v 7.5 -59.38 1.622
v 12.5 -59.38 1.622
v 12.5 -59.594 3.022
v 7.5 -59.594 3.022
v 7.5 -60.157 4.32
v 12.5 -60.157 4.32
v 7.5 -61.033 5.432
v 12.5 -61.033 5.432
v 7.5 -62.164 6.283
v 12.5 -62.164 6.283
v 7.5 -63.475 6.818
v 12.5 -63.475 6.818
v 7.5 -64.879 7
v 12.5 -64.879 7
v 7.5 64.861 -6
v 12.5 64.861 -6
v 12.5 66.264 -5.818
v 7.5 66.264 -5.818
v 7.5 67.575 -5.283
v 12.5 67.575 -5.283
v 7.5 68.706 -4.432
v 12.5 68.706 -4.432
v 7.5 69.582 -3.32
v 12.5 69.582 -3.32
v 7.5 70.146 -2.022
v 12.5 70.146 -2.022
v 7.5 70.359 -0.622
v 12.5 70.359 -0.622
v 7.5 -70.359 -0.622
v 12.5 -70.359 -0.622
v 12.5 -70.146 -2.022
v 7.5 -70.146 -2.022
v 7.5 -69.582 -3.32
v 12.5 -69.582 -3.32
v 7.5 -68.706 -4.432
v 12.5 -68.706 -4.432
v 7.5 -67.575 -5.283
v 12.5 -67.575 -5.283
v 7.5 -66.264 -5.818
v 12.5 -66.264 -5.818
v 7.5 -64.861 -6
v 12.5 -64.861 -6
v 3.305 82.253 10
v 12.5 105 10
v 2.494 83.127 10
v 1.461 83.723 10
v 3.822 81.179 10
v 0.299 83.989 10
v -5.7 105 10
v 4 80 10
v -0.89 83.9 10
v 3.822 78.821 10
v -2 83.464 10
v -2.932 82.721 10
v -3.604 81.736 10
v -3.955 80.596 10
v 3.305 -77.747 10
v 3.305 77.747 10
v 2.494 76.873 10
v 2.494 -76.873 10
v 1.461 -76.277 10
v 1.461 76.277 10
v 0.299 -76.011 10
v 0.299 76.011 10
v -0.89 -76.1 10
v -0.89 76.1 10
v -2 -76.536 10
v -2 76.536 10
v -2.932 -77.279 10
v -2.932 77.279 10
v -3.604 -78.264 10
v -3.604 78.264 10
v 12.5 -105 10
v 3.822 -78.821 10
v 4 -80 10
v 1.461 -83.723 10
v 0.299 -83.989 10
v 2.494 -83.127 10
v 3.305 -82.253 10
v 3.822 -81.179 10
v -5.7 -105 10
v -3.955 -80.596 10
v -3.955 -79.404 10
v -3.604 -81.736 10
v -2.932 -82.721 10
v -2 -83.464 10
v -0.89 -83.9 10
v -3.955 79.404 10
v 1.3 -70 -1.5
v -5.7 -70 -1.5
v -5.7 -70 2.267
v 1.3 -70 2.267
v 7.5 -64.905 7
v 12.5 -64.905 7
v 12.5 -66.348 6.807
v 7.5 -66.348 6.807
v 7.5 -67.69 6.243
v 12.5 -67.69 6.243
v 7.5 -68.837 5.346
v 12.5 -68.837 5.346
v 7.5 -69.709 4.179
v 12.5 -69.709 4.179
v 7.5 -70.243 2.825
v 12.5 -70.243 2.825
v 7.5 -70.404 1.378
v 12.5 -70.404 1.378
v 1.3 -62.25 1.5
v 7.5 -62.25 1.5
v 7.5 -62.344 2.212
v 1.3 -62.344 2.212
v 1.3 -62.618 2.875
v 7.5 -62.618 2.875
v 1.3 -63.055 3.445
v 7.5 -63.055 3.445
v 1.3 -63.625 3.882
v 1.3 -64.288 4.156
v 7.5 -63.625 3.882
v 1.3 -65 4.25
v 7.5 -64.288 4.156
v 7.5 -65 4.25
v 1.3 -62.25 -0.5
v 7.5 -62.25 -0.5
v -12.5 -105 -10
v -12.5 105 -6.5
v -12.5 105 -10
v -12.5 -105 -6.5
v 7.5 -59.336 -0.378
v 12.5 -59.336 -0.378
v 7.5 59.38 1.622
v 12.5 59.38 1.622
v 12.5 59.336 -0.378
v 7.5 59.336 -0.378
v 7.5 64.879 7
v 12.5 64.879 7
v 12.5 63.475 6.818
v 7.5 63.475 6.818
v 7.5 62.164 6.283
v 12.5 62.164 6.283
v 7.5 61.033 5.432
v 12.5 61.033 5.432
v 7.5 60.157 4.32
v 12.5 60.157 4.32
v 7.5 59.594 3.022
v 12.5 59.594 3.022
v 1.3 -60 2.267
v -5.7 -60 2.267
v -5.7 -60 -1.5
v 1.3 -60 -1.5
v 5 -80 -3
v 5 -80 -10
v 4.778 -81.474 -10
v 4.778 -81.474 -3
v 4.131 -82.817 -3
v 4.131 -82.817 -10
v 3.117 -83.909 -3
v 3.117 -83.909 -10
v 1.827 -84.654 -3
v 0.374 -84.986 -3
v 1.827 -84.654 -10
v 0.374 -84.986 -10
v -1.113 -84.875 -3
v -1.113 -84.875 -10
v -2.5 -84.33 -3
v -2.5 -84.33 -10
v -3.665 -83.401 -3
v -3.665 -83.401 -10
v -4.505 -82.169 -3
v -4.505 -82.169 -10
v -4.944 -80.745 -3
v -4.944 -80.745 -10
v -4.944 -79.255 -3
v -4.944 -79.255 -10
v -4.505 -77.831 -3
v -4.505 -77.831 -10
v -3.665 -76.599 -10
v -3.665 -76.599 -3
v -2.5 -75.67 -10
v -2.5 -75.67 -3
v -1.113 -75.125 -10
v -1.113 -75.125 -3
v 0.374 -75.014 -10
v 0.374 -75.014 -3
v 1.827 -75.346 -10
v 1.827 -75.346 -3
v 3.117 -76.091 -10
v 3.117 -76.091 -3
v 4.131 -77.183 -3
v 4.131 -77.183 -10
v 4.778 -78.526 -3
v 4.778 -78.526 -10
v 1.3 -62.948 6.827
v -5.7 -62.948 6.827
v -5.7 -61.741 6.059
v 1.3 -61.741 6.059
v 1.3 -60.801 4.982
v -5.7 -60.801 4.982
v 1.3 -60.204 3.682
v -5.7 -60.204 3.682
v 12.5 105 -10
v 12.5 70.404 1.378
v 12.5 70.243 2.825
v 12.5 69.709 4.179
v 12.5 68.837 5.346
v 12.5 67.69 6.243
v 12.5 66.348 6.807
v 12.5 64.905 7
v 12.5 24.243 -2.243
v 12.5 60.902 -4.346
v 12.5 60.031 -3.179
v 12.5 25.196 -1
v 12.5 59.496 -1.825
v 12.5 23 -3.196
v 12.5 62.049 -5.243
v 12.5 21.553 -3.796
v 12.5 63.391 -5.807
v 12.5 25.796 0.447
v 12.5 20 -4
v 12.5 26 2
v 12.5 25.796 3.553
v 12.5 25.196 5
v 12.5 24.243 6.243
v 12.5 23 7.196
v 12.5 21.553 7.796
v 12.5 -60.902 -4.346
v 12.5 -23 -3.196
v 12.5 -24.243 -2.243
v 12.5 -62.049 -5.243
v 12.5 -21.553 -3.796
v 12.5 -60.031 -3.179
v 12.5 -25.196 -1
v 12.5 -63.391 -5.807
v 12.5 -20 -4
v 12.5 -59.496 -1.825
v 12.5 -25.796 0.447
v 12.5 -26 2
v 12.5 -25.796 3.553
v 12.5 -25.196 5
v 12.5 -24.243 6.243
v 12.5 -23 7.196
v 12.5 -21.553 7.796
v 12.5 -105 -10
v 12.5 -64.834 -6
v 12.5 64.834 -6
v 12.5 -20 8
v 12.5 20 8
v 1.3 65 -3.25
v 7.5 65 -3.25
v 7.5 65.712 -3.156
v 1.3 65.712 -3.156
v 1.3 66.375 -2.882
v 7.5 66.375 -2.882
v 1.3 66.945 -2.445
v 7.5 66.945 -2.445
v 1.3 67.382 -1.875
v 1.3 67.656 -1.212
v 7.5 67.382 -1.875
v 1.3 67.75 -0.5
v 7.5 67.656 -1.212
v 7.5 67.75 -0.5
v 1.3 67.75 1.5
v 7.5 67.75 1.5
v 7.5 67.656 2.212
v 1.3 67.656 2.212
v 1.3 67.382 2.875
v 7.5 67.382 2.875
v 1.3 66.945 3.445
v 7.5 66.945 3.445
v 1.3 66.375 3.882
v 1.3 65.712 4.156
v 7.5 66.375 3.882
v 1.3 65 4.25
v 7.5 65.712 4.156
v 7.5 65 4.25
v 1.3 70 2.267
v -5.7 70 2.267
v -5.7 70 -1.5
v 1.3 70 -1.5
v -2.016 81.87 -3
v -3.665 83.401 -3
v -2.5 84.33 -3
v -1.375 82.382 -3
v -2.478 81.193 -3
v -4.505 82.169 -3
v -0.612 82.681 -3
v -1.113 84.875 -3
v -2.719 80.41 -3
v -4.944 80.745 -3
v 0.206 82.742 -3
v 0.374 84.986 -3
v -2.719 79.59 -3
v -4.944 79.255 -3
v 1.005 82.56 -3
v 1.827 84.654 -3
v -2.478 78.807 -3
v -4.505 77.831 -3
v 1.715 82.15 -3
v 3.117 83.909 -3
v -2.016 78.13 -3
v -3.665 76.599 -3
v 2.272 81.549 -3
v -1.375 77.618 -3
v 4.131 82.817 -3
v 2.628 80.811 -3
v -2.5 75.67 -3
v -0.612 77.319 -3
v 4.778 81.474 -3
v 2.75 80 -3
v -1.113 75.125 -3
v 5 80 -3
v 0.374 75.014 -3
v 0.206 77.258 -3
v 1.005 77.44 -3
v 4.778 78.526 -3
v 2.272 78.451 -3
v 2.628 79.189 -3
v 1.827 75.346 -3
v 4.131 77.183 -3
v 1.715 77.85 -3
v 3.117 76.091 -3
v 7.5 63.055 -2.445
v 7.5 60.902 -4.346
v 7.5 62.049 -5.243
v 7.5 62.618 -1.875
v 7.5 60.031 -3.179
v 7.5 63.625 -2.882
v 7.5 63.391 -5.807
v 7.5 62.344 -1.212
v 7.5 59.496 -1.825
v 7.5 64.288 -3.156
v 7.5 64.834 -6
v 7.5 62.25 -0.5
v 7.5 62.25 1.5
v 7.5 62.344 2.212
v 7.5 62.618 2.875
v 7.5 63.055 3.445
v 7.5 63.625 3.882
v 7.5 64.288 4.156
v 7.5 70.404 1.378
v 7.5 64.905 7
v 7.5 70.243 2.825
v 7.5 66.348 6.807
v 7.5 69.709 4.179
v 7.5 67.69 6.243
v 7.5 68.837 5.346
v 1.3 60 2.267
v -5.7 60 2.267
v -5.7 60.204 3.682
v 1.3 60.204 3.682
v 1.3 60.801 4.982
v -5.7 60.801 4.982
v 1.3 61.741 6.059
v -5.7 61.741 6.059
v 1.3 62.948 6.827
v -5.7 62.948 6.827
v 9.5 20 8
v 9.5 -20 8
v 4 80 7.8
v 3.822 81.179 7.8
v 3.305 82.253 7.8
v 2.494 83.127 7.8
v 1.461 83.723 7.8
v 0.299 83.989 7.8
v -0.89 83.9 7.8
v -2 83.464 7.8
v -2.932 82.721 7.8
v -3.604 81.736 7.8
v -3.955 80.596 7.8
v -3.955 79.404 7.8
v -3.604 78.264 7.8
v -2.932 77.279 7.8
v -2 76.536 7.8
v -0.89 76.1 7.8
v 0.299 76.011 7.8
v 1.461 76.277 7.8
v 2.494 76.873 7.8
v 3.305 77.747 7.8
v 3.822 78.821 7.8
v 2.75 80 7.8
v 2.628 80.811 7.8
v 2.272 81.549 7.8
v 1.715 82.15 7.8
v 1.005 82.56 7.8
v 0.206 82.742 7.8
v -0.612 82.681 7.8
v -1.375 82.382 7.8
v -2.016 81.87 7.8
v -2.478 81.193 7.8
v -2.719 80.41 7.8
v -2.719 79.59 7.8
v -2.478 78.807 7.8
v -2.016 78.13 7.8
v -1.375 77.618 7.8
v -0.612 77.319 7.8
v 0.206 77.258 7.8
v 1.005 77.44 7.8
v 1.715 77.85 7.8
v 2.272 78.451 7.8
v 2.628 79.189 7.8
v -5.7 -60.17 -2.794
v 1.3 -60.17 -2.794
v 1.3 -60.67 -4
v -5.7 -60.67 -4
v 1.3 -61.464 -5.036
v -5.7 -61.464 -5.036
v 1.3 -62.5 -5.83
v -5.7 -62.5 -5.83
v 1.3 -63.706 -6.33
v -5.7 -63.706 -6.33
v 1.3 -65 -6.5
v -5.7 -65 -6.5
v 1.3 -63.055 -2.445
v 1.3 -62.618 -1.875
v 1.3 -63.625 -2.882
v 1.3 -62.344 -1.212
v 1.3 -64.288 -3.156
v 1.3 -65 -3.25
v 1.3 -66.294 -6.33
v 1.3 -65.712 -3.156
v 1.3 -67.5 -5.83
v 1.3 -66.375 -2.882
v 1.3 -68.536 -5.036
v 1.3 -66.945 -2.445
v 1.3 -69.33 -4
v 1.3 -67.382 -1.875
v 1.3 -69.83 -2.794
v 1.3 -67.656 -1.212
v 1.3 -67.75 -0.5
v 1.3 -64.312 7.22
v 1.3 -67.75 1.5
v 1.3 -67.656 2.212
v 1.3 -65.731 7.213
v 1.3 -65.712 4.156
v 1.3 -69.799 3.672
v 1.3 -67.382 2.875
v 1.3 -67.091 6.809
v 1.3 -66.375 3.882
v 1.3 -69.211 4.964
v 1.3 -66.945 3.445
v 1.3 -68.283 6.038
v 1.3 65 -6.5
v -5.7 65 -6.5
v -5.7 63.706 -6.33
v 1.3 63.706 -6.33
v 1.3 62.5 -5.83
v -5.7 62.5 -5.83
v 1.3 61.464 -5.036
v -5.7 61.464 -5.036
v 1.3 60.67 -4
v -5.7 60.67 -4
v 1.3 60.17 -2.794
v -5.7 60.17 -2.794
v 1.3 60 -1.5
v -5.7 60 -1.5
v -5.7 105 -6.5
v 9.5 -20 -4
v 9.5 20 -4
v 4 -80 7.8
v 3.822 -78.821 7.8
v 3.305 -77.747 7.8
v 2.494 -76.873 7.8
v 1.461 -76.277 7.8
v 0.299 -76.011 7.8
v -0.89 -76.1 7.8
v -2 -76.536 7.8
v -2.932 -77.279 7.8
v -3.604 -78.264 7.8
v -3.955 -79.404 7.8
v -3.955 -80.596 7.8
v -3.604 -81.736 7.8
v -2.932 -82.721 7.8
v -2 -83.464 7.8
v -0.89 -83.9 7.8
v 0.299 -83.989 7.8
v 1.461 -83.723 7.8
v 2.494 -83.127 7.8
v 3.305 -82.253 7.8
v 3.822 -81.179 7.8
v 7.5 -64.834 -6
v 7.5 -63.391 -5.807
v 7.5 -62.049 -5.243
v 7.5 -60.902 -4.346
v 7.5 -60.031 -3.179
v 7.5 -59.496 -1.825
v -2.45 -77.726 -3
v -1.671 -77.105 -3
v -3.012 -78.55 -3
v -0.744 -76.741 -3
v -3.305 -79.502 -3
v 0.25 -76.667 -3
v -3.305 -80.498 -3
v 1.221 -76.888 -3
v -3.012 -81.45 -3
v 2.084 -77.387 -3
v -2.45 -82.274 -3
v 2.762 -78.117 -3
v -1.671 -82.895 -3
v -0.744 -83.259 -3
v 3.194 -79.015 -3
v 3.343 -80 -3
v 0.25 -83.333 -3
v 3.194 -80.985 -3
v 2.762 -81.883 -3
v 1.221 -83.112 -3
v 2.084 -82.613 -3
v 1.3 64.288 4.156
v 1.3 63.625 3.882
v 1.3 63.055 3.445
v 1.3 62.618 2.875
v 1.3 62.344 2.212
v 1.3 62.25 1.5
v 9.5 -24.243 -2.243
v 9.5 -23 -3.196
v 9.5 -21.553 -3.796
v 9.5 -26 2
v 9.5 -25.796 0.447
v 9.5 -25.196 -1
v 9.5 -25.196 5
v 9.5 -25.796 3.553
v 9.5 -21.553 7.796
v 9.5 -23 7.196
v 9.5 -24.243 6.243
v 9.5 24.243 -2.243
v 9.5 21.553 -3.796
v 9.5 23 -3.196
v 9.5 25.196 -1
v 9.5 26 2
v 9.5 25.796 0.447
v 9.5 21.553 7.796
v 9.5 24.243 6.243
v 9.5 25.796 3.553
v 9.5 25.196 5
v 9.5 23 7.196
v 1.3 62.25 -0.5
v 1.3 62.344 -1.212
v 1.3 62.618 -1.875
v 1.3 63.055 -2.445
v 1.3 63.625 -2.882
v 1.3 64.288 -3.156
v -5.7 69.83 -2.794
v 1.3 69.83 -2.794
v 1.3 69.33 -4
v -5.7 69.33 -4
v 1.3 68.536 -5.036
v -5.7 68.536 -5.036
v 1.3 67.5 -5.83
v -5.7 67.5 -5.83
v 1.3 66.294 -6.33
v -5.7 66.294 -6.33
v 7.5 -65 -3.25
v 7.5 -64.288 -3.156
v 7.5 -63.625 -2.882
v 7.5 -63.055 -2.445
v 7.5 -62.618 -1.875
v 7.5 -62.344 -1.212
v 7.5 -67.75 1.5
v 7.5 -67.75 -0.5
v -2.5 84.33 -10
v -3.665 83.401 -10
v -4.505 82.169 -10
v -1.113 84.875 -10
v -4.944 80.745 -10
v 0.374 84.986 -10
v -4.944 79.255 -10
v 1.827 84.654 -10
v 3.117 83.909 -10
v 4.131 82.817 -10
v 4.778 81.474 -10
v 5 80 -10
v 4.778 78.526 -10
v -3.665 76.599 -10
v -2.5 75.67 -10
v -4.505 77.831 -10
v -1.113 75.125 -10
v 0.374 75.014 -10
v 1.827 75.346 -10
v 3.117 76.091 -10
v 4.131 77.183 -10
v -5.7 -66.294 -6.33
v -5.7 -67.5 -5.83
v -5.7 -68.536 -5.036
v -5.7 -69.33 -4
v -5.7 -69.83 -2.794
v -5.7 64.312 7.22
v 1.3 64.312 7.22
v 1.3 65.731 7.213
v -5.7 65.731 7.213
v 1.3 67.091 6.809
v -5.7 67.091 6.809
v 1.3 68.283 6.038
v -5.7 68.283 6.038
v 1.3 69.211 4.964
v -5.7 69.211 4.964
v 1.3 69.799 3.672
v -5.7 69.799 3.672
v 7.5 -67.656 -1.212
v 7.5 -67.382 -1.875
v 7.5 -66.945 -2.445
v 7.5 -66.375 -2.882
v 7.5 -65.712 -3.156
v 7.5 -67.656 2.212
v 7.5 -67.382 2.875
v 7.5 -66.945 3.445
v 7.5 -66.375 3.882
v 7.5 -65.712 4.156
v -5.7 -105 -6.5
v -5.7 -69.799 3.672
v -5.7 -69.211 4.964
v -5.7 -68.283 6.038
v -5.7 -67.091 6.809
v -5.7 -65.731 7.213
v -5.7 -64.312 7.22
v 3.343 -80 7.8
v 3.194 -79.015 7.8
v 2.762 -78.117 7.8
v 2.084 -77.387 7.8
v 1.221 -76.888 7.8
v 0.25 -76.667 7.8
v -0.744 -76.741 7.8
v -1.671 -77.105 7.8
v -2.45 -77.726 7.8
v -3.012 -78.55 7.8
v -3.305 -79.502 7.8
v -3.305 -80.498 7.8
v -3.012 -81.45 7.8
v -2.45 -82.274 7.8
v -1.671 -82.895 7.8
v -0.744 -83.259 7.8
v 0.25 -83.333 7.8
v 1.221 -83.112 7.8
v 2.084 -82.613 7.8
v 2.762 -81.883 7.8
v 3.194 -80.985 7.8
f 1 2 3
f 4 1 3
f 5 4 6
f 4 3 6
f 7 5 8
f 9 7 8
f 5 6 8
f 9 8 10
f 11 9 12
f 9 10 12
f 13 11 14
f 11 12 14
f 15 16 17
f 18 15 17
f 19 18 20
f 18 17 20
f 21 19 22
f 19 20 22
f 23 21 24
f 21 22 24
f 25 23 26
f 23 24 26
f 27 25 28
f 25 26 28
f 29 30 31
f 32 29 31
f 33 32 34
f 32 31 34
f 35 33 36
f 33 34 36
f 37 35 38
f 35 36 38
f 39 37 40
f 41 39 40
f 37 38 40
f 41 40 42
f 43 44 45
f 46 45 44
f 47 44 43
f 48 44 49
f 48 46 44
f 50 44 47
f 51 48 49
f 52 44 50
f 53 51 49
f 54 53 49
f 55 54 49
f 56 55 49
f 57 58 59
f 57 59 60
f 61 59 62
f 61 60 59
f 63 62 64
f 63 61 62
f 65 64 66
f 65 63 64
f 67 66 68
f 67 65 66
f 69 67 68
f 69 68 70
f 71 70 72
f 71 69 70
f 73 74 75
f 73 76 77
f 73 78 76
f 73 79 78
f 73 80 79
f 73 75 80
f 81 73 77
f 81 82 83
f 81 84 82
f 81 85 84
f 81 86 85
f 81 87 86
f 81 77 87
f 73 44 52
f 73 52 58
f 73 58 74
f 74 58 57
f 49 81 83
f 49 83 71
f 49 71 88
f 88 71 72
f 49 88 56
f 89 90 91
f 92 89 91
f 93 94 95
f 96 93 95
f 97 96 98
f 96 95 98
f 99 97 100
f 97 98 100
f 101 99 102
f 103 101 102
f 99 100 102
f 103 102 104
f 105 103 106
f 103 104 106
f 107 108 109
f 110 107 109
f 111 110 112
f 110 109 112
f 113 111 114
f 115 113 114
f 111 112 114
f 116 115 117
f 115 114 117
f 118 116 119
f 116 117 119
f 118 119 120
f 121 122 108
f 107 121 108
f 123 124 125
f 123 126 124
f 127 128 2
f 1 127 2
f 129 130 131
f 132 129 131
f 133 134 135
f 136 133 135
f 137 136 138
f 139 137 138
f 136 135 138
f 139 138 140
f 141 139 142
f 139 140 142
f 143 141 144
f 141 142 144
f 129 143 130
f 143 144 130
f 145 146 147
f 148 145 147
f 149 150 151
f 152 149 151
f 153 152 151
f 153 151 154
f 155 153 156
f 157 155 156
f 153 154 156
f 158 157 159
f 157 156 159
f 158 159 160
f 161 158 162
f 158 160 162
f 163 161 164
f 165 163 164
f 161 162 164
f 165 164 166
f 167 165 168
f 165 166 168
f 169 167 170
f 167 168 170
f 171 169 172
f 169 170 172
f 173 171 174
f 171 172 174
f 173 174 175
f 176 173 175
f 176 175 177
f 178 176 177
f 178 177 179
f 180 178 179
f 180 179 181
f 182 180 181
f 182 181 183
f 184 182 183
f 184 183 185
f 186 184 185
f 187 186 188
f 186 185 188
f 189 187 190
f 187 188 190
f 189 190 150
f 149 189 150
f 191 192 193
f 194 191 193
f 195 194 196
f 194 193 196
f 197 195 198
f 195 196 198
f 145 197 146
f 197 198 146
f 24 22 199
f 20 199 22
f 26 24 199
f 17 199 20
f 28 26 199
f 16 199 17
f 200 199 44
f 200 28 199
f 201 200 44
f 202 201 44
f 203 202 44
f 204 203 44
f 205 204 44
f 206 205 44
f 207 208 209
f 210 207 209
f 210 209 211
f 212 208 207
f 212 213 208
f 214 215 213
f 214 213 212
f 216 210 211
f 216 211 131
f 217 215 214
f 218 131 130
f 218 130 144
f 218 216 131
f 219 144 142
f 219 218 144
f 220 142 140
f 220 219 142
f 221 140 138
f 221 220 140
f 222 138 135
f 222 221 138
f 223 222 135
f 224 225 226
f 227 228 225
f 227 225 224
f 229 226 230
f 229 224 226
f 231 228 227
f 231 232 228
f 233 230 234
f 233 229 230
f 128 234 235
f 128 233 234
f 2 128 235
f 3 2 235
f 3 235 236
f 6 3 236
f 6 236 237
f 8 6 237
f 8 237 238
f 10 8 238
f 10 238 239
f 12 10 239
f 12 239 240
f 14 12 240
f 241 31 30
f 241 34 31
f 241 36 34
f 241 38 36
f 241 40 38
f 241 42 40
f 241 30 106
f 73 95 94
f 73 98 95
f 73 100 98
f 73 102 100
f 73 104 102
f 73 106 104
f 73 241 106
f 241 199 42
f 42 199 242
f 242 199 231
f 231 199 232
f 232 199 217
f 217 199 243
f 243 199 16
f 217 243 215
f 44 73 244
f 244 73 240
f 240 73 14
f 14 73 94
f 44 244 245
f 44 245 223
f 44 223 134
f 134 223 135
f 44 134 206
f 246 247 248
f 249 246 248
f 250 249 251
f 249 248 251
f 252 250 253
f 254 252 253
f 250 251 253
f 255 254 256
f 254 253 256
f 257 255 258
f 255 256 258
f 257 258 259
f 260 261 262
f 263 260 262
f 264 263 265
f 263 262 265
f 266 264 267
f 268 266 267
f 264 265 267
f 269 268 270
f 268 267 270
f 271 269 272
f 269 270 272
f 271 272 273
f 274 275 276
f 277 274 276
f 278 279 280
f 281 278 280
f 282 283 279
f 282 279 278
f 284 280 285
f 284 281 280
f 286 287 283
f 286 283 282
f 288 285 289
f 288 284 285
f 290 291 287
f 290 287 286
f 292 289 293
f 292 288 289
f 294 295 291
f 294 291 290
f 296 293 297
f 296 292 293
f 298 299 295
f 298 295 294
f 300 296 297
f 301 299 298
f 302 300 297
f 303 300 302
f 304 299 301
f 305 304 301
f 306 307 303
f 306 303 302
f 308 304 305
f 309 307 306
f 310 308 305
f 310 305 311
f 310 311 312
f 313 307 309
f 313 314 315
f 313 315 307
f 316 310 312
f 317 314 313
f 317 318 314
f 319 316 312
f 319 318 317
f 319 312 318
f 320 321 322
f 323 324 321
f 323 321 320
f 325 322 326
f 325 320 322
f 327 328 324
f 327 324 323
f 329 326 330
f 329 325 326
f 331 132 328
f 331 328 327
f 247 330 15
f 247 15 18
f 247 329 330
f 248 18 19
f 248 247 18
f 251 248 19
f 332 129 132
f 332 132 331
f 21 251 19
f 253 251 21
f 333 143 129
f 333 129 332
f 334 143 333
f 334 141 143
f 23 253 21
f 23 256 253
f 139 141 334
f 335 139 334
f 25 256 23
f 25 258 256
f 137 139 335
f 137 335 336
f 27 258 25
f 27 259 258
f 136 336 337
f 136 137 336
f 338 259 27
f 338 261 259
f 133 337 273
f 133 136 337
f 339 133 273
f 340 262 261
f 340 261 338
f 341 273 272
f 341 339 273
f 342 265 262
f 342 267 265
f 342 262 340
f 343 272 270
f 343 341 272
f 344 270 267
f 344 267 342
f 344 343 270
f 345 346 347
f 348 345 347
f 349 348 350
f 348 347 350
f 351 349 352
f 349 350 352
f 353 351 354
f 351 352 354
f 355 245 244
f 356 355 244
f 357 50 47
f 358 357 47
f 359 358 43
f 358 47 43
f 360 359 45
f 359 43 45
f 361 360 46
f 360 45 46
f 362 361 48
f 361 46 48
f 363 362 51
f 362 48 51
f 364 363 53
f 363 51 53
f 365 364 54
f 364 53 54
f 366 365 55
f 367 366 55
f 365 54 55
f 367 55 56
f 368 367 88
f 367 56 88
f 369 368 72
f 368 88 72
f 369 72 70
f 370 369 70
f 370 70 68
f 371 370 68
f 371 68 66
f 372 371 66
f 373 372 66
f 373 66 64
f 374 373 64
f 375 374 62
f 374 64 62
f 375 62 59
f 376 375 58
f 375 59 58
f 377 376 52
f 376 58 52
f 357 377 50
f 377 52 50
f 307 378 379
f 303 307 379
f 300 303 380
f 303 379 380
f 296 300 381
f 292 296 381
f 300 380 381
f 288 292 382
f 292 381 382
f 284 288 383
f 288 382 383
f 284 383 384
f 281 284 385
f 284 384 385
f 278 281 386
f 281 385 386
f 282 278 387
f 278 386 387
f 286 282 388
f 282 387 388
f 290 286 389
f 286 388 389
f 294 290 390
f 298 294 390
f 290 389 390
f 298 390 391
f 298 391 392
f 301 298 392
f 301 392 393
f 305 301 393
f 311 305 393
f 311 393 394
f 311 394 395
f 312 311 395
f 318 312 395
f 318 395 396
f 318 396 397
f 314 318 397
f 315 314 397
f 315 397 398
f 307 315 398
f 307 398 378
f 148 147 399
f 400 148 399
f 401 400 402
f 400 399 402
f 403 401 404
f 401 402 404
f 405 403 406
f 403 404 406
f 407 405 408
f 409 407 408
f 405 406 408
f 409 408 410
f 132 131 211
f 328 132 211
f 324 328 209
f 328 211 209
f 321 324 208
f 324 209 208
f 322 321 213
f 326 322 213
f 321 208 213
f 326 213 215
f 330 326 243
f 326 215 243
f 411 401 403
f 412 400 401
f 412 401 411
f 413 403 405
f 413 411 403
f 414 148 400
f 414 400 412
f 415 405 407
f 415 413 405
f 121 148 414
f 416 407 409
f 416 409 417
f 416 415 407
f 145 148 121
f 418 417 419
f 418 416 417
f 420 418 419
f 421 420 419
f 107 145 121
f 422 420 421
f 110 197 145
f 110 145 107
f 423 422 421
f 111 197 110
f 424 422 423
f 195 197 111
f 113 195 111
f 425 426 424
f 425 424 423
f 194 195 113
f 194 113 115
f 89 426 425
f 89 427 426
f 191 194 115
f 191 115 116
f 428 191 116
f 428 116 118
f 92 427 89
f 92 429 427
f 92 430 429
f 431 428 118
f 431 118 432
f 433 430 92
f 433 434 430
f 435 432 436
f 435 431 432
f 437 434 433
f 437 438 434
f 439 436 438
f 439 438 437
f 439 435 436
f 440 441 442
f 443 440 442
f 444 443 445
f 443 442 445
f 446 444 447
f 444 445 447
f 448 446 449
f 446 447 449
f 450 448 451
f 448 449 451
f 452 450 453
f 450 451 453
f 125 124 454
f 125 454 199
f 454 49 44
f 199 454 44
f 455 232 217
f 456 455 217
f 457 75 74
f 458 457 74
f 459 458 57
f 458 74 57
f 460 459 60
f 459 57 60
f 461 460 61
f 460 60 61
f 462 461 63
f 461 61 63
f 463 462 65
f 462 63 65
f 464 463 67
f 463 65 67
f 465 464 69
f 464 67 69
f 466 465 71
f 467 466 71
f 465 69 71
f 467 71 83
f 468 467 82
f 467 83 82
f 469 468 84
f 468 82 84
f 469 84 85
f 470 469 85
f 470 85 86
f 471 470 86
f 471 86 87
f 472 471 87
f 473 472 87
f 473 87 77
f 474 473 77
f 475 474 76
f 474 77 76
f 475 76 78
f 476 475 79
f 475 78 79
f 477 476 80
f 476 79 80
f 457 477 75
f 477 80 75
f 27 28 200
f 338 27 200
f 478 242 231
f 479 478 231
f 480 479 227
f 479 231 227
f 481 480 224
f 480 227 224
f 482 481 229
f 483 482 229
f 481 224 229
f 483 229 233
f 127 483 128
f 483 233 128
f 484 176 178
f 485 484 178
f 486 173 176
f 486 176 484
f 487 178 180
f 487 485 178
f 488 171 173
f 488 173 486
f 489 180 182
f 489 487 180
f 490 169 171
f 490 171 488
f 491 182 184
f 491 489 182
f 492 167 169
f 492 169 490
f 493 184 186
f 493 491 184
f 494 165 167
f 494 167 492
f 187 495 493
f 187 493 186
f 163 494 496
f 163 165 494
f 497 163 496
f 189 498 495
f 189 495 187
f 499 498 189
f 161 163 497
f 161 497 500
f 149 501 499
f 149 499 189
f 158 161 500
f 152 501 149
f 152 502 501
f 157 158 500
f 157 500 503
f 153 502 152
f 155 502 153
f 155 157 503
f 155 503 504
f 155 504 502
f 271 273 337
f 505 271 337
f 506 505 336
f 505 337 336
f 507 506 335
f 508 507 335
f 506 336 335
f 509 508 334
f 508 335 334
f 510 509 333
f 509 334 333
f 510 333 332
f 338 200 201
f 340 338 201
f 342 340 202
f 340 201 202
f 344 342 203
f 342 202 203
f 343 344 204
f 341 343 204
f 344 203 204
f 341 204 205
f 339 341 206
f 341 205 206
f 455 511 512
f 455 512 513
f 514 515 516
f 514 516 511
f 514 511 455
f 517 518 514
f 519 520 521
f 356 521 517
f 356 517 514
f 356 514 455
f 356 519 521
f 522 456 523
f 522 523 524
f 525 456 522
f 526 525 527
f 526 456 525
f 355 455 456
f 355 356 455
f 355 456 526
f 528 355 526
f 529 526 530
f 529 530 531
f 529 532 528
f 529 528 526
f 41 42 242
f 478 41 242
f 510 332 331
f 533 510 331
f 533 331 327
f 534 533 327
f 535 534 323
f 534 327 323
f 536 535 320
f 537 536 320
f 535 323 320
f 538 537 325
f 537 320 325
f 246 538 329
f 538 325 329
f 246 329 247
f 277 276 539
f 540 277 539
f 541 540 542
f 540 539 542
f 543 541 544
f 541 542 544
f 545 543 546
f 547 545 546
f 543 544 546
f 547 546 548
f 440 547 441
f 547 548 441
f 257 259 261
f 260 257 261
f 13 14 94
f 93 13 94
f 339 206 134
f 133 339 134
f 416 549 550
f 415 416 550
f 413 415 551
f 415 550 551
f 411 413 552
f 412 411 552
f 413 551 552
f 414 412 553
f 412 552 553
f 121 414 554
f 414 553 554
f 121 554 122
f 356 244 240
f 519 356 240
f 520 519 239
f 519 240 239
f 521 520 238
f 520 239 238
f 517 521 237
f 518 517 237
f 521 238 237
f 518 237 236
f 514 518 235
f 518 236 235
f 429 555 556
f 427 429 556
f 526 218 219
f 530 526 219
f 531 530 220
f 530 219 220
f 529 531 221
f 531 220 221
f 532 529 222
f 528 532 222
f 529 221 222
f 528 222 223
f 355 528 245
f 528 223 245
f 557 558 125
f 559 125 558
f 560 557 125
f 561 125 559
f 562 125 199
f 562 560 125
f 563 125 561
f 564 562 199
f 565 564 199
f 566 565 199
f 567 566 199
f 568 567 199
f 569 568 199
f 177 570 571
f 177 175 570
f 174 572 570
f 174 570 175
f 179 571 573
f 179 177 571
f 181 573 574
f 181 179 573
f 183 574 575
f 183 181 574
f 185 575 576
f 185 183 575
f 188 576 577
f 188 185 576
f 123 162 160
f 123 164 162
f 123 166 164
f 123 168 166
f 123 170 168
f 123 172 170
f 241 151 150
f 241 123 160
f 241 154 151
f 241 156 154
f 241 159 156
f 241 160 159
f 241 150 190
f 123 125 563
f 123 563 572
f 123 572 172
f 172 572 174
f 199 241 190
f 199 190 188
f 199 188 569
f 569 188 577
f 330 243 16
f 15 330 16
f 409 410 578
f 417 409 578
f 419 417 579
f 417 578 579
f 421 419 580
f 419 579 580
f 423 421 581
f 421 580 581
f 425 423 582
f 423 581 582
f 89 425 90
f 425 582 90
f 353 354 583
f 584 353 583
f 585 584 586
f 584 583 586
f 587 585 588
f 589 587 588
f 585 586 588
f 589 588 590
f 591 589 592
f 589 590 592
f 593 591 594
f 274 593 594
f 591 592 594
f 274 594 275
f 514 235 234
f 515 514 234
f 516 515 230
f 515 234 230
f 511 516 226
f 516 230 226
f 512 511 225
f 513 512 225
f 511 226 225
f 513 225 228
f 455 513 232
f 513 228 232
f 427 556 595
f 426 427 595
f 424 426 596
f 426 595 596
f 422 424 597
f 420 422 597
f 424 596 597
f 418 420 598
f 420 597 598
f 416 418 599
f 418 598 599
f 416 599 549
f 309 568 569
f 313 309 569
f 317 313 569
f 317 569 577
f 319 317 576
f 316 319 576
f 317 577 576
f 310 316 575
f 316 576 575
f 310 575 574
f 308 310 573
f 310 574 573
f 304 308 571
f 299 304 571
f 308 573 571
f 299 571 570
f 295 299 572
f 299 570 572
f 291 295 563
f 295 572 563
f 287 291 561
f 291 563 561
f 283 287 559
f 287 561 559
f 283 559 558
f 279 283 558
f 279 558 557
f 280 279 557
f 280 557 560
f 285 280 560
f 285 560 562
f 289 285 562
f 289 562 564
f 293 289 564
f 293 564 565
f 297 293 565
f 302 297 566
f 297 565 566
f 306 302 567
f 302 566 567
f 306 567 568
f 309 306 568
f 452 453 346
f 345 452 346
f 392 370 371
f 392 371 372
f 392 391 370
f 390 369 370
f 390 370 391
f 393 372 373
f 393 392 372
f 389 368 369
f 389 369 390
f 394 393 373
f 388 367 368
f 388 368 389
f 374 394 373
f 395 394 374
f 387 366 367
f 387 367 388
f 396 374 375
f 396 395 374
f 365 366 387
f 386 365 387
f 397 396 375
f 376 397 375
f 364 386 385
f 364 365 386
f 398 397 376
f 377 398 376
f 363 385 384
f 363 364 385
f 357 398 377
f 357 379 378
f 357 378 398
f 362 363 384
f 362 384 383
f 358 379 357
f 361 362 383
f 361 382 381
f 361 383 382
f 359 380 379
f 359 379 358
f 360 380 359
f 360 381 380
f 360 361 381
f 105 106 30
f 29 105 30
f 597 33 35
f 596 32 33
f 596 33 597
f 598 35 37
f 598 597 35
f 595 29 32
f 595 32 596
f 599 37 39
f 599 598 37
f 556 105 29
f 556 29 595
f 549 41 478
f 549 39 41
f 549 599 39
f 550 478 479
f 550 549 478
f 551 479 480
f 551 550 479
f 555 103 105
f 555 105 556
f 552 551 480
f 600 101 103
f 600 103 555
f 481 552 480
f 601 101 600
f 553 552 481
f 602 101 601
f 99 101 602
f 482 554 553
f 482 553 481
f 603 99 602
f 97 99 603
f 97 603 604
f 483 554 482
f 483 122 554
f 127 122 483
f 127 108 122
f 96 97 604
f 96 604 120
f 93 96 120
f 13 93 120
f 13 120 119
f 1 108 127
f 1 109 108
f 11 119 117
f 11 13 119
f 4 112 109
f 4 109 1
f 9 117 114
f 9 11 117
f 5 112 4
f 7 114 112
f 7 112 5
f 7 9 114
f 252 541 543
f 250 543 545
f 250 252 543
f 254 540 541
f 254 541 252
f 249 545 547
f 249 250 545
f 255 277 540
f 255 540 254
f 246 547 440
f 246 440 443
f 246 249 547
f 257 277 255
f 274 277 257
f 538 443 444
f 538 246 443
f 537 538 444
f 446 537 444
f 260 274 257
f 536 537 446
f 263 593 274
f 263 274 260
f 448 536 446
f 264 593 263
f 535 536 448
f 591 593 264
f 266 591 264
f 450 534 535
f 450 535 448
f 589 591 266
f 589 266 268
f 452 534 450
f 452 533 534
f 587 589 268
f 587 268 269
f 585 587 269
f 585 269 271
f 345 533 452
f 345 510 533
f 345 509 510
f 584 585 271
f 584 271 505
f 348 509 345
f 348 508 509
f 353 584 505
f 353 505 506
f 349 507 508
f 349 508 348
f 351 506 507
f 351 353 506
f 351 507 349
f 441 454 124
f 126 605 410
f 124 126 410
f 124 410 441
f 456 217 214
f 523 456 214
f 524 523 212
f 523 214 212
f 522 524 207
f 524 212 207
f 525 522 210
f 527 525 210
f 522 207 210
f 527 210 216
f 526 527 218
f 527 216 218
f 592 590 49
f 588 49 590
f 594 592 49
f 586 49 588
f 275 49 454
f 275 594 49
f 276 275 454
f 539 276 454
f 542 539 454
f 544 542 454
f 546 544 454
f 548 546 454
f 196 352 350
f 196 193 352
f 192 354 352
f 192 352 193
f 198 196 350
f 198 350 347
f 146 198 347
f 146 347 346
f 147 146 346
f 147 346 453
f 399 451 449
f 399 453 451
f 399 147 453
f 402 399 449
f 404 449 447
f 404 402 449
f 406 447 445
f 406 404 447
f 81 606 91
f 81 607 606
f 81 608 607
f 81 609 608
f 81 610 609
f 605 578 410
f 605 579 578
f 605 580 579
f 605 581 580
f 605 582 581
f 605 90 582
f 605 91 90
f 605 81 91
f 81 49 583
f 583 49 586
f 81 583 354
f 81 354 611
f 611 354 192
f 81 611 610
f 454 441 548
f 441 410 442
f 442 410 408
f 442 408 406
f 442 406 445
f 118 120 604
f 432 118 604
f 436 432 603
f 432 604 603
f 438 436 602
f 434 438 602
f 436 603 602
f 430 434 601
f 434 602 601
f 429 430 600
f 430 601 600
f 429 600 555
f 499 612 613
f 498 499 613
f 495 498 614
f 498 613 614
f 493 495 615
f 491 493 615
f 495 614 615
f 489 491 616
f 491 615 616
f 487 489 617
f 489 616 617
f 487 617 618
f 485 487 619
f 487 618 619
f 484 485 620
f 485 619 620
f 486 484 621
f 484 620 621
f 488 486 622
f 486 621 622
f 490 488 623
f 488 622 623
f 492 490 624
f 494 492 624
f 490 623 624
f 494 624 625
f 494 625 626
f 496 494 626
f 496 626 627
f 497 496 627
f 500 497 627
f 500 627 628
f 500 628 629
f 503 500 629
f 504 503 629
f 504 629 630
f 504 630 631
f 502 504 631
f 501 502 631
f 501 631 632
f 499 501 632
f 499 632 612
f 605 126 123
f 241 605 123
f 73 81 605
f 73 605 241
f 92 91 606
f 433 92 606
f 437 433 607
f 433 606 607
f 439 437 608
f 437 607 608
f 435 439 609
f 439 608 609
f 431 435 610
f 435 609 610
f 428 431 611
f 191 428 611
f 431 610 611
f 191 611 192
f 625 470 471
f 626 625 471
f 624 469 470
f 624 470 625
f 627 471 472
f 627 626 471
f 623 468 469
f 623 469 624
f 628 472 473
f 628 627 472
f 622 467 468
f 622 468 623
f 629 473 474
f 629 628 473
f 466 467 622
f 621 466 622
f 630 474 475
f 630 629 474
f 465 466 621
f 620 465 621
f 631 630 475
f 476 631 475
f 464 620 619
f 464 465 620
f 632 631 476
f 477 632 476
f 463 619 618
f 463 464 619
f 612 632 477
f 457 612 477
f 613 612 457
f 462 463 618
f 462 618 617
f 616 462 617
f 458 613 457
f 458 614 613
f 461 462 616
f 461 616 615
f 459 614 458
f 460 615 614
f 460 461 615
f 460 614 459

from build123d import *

# Parameters (mm, degrees)
F1_DEPTH  = 105
F2_R      = 2.75
F2_R_2    = 3.342639
F3_DEPTH  = 20.001
F5_DEPTH  = 25.001
F7_DEPTH  = 5
F9_DEPTH  = 7
F10_R     = 4
F11_DEPTH = 2.2
F12_R     = 5
F13_DEPTH = 7
F15_DEPTH = 3


with BuildPart() as f1:
    # F0 (on Front) → F1 (new body, symmetric)
    with BuildSketch(Plane.XZ):
        Polygon((-12.5, -6.5), (-12.5, -10), (12.5, -10), (12.5, 10), (-5.7, 10), (-5.7, -6.5), align=None)
    extrude(amount=F1_DEPTH, both=True)

    # F2 (on face) → F3 (cut, through all)
    with BuildSketch(Plane.XY.offset(10)):
        with Locations((0, 80)):
            Circle(F2_R)
        with Locations((0, -80)):
            Circle(F2_R_2)
    extrude(amount=-F3_DEPTH, mode=Mode.SUBTRACT)

    # F4 (on face) → F5 (cut, through all)
    with BuildSketch(Plane.YZ.offset(12.5)):
        with BuildLine():
            ThreePointArc((-65, 4.25), (-66.944544, 3.444544), (-67.75, 1.5))
            Line((-67.75, 1.5), (-67.75, -0.5))
            ThreePointArc((-67.75, -0.5), (-66.944544, -2.444544), (-65, -3.25))
            ThreePointArc((-65, -3.25), (-63.055456, -2.444544), (-62.25, -0.5))
            Line((-62.25, -0.5), (-62.25, 1.5))
            ThreePointArc((-62.25, 1.5), (-63.055456, 3.444544), (-65, 4.25))
        make_face()
        with BuildLine():
            ThreePointArc((65, 4.25), (63.055456, 3.444544), (62.25, 1.5))
            Line((62.25, 1.5), (62.25, -0.5))
            ThreePointArc((62.25, -0.5), (63.055456, -2.444544), (65, -3.25))
            ThreePointArc((65, -3.25), (66.944544, -2.444544), (67.75, -0.5))
            Line((67.75, -0.5), (67.75, 1.5))
            ThreePointArc((67.75, 1.5), (66.944544, 3.444544), (65, 4.25))
        make_face()
    extrude(amount=-F5_DEPTH, mode=Mode.SUBTRACT)

    # F6 (on face) → F7 (cut)
    with BuildSketch(Plane.YZ.offset(12.5)):
        with BuildLine():
            Line((-64.860655, -6), (-64.834395, -6))
            ThreePointArc((-64.834395, -6), (-60.902267, -4.345564), (-59.335758, -0.377587))
            Line((-59.335758, -0.377587), (-59.380282, 1.622413))
            ThreePointArc((-59.380282, 1.622413), (-61.033355, 5.432129), (-64.87892, 7))
            Line((-64.87892, 7), (-64.905179, 7))
            ThreePointArc((-64.905179, 7), (-68.837308, 5.345564), (-70.403817, 1.377587))
            Line((-70.403817, 1.377587), (-70.359292, -0.622413))
            ThreePointArc((-70.359292, -0.622413), (-68.706219, -4.432129), (-64.860655, -6))
        make_face()
        with BuildLine():
            Line((59.380282, 1.622413), (59.335758, -0.377587))
            ThreePointArc((59.335758, -0.377587), (60.902267, -4.345564), (64.834395, -6))
            Line((64.834395, -6), (64.860655, -6))
            ThreePointArc((64.860655, -6), (68.706219, -4.432129), (70.359292, -0.622413))
            Line((70.359292, -0.622413), (70.403817, 1.377587))
            ThreePointArc((70.403817, 1.377587), (68.837308, 5.345564), (64.905179, 7))
            Line((64.905179, 7), (64.87892, 7))
            ThreePointArc((64.87892, 7), (61.033355, 5.432129), (59.380282, 1.622413))
        make_face()
    extrude(amount=-F7_DEPTH, mode=Mode.SUBTRACT)

    # F8 (on face) → F9 (cut)
    with BuildSketch(Plane(origin=(-5.7, 0, 0), x_dir=(0, -1, 0), z_dir=(-1, 0, 0))):
        with BuildLine():
            ThreePointArc((60, -1.5), (61.464466, -5.035534), (65, -6.5))
            ThreePointArc((65, -6.5), (68.535534, -5.035534), (70, -1.5))
            Line((70, -1.5), (70, 2.267072))
            ThreePointArc((70, 2.267072), (67.714856, 6.465829), (62.948177, 6.826679))
            ThreePointArc((62.948177, 6.826679), (60.801243, 4.981928), (60, 2.267072))
            Line((60, 2.267072), (60, -1.5))
        make_face()
        with BuildLine():
            ThreePointArc((67.75, -0.5), (65, -3.25), (62.25, -0.5))
            Line((62.25, -0.5), (62.25, 1.5))
            ThreePointArc((62.25, 1.5), (65, 4.25), (67.75, 1.5))
            Line((67.75, 1.5), (67.75, -0.5))
        make_face(mode=Mode.SUBTRACT)
        with BuildLine():
            ThreePointArc((-62.948177, 6.826679), (-67.714856, 6.465829), (-70, 2.267072))
            Line((-70, 2.267072), (-70, -1.5))
            ThreePointArc((-70, -1.5), (-68.535534, -5.035534), (-65, -6.5))
            ThreePointArc((-65, -6.5), (-61.464466, -5.035534), (-60, -1.5))
            Line((-60, -1.5), (-60, 2.267072))
            ThreePointArc((-60, 2.267072), (-60.801243, 4.981928), (-62.948177, 6.826679))
        make_face()
        with BuildLine():
            ThreePointArc((-62.25, -0.5), (-65, -3.25), (-67.75, -0.5))
            Line((-67.75, -0.5), (-67.75, 1.5))
            ThreePointArc((-67.75, 1.5), (-65, 4.25), (-62.25, 1.5))
            Line((-62.25, 1.5), (-62.25, -0.5))
        make_face(mode=Mode.SUBTRACT)
    extrude(amount=-F9_DEPTH, mode=Mode.SUBTRACT)

    # F10 (on face) → F11 (cut)
    with BuildSketch(Plane.XY.offset(10)):
        with Locations((0, -80)):
            Circle(F10_R)
        with Locations((0, 80)):
            Circle(F10_R)
    extrude(amount=-F11_DEPTH, mode=Mode.SUBTRACT)

    # F12 (on face) → F13 (cut)
    with BuildSketch(Plane(origin=(0, 0, -10), x_dir=(1, 0, 0), z_dir=(0, 0, -1))):
        with Locations((0, 80)):
            Circle(F12_R)
        with Locations((0, -80)):
            Circle(F12_R)
    extrude(amount=-F13_DEPTH, mode=Mode.SUBTRACT)

    # F14 (on face) → F15 (cut)
    with BuildSketch(Plane.YZ.offset(12.5)):
        with BuildLine():
            Line((20, 8), (-20, 8))
            ThreePointArc((-20, 8), (-24.242641, 6.242641), (-26, 2))
            ThreePointArc((-26, 2), (-24.242641, -2.242641), (-20, -4))
            Line((-20, -4), (20, -4))
            ThreePointArc((20, -4), (24.242641, -2.242641), (26, 2))
            ThreePointArc((26, 2), (24.242641, 6.242641), (20, 8))
        make_face()
    extrude(amount=-F15_DEPTH, mode=Mode.SUBTRACT)


solid = f1.part
